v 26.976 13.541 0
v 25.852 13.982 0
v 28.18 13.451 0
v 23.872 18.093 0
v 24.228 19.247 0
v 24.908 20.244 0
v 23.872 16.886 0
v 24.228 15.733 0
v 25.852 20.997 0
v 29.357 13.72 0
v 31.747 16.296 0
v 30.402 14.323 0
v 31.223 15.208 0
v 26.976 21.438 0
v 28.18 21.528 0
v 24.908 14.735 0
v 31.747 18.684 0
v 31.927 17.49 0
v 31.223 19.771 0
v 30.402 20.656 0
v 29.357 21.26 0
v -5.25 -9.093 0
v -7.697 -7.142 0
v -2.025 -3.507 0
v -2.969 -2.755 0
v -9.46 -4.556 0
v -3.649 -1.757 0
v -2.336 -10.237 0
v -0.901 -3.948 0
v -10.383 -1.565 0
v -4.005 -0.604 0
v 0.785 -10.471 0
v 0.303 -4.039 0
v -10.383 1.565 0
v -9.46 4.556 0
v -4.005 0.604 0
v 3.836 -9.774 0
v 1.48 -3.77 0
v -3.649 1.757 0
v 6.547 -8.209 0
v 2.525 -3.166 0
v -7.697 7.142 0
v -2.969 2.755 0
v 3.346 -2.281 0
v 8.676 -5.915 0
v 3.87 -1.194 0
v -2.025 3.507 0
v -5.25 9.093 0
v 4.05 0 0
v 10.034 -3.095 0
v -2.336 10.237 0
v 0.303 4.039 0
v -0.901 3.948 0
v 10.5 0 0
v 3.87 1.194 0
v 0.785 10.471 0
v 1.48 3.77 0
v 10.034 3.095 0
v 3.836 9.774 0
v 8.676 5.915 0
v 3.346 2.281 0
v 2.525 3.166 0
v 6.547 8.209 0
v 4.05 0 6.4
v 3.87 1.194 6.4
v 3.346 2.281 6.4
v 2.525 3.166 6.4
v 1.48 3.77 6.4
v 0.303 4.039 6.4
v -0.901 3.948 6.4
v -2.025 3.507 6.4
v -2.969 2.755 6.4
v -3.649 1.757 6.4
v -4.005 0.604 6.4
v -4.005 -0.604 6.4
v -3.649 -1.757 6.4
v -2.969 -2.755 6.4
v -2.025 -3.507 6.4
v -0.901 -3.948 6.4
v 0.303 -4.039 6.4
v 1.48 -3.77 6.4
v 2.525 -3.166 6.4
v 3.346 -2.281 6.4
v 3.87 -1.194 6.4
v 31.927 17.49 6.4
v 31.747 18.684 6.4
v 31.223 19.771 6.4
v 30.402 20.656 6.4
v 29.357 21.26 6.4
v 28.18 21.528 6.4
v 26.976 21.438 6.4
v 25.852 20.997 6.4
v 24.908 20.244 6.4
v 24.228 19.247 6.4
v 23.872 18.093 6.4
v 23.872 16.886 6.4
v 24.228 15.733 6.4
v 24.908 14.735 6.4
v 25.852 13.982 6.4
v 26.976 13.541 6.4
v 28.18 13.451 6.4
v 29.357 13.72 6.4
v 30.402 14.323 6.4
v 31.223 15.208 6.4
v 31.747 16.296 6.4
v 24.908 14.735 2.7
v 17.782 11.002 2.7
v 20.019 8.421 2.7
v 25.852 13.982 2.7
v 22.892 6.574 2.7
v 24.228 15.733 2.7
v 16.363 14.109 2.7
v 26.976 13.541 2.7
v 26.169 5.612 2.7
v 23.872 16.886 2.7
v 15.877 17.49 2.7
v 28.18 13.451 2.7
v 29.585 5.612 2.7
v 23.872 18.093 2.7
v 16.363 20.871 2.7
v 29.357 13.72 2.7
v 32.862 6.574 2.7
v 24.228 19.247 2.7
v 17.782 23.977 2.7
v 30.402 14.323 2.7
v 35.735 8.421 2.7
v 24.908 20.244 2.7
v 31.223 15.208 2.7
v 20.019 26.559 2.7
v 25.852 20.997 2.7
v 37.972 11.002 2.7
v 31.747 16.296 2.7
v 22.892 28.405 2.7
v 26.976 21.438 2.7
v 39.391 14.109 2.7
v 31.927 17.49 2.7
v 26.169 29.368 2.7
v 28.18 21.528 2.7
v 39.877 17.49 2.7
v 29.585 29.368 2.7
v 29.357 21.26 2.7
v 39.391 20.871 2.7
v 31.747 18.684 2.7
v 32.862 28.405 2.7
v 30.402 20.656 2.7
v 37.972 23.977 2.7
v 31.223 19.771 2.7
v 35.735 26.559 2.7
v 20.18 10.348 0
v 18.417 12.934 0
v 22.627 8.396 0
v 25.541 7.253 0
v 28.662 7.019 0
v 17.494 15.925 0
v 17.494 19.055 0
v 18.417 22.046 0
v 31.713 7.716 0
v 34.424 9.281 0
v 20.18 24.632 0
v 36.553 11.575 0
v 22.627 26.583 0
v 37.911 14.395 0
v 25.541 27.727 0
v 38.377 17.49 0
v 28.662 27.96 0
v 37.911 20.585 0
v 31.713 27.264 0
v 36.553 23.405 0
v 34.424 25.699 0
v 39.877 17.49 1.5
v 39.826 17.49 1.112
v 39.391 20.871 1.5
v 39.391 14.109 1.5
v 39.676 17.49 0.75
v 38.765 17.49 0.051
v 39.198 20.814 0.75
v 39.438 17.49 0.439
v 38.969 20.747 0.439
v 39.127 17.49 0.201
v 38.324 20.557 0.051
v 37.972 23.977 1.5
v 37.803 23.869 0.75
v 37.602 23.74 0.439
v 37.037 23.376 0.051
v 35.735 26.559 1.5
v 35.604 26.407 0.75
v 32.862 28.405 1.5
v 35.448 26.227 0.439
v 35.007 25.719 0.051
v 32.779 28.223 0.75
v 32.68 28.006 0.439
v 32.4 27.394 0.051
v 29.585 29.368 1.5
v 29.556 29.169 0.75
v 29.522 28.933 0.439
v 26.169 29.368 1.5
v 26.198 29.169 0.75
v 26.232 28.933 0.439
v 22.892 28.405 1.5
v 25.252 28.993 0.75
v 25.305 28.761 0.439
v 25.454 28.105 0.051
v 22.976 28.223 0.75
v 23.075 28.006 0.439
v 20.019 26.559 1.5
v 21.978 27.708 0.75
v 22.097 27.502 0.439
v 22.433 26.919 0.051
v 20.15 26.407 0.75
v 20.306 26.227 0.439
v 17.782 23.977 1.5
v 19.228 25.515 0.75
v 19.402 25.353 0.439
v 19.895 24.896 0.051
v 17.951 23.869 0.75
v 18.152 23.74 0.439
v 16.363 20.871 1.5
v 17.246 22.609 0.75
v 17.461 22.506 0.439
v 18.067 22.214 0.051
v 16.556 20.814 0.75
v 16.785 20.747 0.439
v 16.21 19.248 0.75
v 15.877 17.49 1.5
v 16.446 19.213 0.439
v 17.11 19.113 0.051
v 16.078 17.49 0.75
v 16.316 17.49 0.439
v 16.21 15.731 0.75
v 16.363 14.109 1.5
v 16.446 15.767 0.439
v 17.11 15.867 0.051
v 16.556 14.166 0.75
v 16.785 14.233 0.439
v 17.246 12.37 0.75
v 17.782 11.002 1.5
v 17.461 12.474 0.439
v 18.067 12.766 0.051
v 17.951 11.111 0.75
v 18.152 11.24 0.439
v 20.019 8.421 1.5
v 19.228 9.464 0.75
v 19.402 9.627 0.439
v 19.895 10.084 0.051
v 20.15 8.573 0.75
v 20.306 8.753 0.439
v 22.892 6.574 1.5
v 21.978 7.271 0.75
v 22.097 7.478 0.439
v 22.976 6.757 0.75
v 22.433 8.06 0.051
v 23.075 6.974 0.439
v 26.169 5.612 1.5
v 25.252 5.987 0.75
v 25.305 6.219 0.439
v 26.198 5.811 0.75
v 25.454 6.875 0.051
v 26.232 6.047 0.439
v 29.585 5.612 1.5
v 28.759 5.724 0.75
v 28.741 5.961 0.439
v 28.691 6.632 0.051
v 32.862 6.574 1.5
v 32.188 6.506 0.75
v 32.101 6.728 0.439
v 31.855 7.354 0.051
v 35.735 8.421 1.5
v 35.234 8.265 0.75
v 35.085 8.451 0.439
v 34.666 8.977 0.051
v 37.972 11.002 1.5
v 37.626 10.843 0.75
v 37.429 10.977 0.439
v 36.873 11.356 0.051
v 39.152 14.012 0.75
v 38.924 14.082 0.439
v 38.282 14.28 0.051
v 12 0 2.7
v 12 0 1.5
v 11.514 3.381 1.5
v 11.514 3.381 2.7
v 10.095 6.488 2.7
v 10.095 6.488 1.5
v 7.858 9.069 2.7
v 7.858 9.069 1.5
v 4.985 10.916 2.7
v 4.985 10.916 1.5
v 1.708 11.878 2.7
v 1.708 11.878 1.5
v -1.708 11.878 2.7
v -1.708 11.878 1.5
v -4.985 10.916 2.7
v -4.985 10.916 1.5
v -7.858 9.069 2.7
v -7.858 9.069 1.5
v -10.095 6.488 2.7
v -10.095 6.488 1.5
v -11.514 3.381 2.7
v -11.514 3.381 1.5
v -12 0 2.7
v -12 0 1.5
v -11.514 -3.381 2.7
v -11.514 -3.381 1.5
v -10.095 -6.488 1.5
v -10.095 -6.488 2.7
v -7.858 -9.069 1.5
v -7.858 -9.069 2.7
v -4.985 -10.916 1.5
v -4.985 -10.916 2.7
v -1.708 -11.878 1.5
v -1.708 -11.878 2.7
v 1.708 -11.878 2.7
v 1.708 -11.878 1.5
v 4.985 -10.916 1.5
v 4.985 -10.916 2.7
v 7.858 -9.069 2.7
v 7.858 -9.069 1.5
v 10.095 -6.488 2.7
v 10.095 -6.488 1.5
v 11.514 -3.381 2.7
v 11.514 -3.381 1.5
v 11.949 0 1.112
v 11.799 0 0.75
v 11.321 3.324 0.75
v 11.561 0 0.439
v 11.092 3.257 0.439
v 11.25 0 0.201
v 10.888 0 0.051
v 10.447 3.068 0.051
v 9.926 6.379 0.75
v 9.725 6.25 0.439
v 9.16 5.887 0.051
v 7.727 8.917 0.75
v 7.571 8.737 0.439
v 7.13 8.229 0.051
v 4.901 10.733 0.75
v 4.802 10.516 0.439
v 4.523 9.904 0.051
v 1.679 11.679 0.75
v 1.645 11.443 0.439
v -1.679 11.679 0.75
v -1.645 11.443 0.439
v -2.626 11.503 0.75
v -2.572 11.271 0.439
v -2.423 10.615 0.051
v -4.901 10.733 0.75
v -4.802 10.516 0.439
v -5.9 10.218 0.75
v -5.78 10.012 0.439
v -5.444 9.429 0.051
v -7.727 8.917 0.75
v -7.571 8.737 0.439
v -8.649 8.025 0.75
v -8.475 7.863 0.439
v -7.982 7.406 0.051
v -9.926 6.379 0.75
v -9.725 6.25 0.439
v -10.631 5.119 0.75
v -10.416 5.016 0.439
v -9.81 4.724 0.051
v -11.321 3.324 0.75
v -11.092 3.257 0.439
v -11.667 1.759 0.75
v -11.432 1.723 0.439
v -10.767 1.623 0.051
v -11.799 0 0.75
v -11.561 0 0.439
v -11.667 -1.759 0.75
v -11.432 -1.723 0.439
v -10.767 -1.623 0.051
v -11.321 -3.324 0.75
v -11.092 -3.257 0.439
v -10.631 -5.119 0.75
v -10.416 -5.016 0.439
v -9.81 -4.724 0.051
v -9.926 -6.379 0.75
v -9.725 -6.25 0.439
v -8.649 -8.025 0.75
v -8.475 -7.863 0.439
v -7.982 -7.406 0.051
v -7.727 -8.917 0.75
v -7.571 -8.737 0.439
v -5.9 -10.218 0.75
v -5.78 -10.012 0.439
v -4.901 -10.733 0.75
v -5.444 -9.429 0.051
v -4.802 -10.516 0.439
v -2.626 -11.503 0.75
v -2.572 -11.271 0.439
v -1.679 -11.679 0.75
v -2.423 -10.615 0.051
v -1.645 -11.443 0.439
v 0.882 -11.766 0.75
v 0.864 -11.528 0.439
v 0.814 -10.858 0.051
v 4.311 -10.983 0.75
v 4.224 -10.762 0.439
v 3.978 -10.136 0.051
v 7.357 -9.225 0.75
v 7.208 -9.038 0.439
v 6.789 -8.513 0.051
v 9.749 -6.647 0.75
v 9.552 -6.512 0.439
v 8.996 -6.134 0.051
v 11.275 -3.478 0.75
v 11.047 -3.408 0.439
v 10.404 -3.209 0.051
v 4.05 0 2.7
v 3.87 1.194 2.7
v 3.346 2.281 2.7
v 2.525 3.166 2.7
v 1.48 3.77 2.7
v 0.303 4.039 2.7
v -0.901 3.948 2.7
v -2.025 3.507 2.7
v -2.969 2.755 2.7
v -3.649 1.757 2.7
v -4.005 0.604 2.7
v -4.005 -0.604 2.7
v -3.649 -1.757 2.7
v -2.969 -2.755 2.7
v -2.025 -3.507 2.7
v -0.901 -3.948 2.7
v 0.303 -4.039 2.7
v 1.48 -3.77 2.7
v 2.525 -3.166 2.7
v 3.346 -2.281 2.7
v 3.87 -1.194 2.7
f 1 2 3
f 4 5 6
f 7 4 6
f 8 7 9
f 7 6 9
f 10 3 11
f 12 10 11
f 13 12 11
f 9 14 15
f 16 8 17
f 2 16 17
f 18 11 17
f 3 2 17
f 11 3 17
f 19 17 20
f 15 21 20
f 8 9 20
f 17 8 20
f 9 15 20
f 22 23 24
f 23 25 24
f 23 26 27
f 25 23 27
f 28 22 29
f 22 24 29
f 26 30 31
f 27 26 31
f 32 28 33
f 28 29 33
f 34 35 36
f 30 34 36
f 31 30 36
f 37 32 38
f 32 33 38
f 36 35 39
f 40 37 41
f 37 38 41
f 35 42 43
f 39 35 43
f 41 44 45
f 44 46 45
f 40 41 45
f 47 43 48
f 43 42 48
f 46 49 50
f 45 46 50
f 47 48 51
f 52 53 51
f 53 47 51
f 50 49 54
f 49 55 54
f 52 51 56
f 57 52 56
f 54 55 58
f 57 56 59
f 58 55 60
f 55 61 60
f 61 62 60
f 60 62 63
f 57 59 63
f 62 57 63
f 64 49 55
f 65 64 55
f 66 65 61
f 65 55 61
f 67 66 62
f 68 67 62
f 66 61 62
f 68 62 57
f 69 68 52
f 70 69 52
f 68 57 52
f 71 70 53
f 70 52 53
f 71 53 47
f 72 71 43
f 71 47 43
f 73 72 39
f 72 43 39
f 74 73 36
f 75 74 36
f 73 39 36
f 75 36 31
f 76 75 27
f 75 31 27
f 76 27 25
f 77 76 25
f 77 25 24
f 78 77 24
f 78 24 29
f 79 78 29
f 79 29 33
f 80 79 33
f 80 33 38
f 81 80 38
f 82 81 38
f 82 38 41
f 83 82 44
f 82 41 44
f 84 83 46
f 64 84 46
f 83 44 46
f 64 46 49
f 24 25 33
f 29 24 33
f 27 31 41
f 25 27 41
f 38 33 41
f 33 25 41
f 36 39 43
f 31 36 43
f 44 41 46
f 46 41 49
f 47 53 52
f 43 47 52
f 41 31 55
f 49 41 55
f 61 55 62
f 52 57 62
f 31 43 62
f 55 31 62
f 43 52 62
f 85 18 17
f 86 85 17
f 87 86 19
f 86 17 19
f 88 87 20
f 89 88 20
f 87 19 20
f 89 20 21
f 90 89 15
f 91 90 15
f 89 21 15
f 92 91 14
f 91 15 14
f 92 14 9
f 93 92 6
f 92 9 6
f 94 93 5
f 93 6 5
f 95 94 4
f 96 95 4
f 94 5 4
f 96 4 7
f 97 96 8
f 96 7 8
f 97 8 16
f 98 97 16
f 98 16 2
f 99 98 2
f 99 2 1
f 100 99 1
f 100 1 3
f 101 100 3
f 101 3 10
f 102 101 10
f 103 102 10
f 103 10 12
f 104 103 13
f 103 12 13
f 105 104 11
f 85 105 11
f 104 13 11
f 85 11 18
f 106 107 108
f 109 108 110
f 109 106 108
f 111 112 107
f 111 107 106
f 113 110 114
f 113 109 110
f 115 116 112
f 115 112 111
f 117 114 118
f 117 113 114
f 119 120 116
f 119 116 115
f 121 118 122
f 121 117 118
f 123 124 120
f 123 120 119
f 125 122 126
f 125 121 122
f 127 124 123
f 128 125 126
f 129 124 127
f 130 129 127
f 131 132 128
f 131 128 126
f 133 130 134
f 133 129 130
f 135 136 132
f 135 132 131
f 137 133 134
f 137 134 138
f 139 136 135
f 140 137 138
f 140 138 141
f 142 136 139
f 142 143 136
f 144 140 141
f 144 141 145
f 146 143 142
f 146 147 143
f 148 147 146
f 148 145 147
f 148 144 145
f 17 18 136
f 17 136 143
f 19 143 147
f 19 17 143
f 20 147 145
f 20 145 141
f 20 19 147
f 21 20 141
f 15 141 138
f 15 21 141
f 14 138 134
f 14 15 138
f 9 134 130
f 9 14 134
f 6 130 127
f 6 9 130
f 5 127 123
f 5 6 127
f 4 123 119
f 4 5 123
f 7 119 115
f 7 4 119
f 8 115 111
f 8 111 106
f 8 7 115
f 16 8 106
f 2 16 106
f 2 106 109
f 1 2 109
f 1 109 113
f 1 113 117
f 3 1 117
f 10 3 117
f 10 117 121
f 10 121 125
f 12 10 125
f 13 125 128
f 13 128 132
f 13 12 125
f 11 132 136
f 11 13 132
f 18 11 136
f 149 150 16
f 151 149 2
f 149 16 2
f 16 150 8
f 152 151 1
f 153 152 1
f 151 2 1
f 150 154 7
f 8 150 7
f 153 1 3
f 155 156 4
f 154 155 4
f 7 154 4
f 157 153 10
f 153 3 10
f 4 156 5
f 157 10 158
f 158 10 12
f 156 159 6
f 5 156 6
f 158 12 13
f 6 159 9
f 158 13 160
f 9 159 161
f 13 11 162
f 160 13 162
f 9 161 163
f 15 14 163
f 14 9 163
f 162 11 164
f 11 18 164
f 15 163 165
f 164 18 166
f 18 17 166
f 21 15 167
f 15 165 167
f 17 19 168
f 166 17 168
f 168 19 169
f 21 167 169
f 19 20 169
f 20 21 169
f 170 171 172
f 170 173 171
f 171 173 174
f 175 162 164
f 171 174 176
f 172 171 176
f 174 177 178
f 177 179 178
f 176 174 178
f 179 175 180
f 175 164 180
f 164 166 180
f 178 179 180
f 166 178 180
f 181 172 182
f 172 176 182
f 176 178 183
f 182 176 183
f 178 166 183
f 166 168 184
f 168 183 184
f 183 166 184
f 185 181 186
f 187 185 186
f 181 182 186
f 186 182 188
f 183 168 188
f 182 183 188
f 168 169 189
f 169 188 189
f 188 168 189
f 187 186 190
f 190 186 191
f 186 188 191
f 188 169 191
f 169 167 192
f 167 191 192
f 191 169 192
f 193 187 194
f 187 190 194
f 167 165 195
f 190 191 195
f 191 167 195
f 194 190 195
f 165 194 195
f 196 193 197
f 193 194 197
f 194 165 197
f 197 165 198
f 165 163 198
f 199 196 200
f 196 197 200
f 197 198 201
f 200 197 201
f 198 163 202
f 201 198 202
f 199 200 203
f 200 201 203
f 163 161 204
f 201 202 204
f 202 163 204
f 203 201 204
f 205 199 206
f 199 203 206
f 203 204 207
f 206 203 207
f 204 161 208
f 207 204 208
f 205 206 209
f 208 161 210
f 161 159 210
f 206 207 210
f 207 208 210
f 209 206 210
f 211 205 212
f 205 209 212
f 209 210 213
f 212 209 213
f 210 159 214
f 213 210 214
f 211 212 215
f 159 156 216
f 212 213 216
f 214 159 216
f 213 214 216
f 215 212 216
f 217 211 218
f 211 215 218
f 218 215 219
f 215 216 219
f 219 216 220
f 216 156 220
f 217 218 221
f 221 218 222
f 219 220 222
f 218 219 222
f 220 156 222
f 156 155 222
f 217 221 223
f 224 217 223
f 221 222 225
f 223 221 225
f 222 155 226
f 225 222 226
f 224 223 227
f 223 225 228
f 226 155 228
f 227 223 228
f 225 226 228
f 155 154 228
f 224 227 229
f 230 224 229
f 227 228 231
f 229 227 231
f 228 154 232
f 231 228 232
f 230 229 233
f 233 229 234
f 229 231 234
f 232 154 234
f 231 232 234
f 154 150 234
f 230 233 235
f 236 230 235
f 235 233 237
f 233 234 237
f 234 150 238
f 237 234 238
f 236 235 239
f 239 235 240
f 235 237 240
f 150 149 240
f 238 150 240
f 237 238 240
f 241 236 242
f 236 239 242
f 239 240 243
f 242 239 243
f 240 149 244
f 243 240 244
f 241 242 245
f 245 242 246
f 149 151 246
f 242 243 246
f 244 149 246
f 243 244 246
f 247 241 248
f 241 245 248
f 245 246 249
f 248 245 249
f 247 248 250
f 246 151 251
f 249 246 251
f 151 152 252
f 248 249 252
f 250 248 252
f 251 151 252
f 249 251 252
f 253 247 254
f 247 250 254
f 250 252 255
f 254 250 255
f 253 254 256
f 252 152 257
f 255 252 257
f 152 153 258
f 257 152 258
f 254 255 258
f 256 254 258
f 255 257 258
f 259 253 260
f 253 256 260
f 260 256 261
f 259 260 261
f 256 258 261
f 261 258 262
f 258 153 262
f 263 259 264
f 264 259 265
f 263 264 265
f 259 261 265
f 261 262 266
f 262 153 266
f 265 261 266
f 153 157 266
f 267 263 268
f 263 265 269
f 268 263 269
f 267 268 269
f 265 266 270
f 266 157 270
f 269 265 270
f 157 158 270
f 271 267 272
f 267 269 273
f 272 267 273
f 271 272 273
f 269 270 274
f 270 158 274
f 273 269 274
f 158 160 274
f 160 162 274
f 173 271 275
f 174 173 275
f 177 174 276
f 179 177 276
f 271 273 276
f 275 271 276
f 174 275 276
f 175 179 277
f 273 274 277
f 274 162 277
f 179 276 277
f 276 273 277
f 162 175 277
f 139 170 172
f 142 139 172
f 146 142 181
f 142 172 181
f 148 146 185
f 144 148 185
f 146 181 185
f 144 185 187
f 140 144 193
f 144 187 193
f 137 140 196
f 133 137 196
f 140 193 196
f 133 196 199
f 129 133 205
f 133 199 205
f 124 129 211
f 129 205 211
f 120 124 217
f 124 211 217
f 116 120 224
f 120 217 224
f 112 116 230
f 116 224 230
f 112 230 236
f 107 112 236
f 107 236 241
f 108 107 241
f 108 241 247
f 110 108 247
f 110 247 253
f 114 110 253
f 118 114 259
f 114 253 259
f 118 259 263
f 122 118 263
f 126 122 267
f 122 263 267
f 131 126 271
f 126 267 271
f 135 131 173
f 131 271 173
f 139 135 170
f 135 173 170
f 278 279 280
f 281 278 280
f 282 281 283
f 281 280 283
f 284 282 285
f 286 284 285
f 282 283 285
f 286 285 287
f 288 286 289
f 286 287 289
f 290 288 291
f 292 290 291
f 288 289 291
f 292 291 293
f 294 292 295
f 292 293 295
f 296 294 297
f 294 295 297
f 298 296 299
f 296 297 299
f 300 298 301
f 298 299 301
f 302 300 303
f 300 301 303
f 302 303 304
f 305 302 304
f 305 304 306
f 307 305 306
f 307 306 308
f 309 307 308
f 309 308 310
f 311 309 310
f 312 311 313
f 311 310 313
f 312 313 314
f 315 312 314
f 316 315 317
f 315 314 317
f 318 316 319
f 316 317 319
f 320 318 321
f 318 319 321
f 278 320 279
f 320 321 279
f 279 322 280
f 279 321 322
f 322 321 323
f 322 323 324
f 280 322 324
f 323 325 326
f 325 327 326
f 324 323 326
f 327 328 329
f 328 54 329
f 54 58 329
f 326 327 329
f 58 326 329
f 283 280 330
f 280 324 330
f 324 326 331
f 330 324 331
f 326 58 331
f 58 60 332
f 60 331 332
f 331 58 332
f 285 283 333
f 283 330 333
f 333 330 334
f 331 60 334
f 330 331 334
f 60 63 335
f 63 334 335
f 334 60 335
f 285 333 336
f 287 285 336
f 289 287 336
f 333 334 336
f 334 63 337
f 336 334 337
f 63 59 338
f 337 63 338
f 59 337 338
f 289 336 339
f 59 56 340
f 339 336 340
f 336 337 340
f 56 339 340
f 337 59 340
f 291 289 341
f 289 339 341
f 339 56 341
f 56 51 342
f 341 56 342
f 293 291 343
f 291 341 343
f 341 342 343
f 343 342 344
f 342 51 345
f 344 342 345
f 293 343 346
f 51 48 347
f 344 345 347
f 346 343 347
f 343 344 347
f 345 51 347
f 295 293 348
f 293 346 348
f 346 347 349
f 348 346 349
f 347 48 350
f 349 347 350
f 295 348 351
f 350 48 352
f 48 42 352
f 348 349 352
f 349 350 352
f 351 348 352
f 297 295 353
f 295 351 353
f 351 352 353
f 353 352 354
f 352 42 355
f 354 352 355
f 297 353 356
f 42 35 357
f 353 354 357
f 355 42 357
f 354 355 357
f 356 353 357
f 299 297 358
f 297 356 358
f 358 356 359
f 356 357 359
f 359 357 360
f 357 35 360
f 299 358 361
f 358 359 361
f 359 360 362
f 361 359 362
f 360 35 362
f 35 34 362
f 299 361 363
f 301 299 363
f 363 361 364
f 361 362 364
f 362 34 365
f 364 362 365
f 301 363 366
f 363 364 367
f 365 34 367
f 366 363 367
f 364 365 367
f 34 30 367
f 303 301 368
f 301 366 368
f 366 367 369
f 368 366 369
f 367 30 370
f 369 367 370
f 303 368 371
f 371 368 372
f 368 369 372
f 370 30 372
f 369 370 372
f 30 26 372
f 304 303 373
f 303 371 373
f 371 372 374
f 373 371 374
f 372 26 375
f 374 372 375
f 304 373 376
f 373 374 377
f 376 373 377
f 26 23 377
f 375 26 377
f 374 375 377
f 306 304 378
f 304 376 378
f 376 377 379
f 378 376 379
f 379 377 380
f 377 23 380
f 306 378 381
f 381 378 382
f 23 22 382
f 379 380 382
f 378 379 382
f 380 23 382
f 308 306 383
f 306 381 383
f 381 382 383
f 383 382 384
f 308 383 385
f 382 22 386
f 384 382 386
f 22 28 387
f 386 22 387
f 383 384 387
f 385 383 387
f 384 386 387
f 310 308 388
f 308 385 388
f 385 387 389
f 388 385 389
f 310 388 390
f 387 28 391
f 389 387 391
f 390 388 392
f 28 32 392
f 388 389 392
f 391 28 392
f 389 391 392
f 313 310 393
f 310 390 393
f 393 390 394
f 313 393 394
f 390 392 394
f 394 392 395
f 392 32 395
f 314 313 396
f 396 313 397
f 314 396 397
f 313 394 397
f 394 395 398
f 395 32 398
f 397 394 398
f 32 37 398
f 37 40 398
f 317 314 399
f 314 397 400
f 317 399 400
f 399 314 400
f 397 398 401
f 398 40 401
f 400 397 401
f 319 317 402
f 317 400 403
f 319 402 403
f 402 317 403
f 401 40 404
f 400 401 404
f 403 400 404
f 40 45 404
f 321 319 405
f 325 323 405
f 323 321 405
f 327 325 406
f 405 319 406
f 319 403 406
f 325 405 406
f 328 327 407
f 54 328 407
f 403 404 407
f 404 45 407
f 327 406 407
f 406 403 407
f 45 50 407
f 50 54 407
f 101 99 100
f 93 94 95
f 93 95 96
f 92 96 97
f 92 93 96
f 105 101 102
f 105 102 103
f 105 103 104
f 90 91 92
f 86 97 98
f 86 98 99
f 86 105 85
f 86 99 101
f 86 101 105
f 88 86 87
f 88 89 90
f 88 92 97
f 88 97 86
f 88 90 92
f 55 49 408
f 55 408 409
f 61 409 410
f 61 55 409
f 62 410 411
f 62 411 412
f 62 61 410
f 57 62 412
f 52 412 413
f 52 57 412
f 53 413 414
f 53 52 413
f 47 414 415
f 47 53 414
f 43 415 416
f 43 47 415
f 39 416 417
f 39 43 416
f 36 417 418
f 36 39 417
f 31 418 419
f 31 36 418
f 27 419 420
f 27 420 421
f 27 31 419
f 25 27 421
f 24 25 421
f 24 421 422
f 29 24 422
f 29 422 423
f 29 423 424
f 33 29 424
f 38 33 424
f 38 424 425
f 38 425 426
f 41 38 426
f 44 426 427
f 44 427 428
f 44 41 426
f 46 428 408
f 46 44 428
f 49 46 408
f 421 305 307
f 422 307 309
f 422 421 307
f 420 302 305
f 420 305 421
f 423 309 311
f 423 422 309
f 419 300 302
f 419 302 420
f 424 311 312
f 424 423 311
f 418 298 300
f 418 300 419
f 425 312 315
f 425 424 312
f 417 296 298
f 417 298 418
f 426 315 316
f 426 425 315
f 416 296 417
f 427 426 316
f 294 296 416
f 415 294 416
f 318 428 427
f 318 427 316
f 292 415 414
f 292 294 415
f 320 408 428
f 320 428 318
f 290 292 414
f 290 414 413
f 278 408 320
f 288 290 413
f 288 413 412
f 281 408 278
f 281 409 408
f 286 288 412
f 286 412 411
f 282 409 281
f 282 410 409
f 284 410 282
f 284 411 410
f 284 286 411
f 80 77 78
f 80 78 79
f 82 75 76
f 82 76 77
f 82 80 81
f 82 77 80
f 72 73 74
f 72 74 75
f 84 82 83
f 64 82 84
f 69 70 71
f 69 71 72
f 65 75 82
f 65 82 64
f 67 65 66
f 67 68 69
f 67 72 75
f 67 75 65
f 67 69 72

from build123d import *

# Parameters (mm, degrees)
F0_R     = 12
F0_R_2   = 4.05
F1_DEPTH = 2.7
F2_DEPTH = 6.4
F3_R     = 1.5


with BuildPart() as f1:
    # F0 (on Top) → F1 (new body)
    with BuildSketch(Plane.XY):
        Circle(F0_R)
        Circle(F0_R_2, mode=Mode.SUBTRACT)
        with Locations((27.877051, 17.489759)):
            Circle(F0_R)
        with Locations((27.877051, 17.489759)):
            Circle(F0_R_2, mode=Mode.SUBTRACT)
    extrude(amount=F1_DEPTH)

    # F3
    f3_edges = [f1.edges().sort_by_distance(p)[0] for p in [
        (15.877051, 17.489759, 0),
        (-12, 0, 0),
    ]]
    fillet(f3_edges, radius=F3_R)


with BuildPart() as f2:
    # F0 (on Top) → F2 (new body)
    with BuildSketch(Plane.XY):
        Circle(F0_R_2)
        with Locations((27.877051, 17.489759)):
            Circle(F0_R_2)
    extrude(amount=F2_DEPTH)


solid = Compound([f1.part, f2.part])
